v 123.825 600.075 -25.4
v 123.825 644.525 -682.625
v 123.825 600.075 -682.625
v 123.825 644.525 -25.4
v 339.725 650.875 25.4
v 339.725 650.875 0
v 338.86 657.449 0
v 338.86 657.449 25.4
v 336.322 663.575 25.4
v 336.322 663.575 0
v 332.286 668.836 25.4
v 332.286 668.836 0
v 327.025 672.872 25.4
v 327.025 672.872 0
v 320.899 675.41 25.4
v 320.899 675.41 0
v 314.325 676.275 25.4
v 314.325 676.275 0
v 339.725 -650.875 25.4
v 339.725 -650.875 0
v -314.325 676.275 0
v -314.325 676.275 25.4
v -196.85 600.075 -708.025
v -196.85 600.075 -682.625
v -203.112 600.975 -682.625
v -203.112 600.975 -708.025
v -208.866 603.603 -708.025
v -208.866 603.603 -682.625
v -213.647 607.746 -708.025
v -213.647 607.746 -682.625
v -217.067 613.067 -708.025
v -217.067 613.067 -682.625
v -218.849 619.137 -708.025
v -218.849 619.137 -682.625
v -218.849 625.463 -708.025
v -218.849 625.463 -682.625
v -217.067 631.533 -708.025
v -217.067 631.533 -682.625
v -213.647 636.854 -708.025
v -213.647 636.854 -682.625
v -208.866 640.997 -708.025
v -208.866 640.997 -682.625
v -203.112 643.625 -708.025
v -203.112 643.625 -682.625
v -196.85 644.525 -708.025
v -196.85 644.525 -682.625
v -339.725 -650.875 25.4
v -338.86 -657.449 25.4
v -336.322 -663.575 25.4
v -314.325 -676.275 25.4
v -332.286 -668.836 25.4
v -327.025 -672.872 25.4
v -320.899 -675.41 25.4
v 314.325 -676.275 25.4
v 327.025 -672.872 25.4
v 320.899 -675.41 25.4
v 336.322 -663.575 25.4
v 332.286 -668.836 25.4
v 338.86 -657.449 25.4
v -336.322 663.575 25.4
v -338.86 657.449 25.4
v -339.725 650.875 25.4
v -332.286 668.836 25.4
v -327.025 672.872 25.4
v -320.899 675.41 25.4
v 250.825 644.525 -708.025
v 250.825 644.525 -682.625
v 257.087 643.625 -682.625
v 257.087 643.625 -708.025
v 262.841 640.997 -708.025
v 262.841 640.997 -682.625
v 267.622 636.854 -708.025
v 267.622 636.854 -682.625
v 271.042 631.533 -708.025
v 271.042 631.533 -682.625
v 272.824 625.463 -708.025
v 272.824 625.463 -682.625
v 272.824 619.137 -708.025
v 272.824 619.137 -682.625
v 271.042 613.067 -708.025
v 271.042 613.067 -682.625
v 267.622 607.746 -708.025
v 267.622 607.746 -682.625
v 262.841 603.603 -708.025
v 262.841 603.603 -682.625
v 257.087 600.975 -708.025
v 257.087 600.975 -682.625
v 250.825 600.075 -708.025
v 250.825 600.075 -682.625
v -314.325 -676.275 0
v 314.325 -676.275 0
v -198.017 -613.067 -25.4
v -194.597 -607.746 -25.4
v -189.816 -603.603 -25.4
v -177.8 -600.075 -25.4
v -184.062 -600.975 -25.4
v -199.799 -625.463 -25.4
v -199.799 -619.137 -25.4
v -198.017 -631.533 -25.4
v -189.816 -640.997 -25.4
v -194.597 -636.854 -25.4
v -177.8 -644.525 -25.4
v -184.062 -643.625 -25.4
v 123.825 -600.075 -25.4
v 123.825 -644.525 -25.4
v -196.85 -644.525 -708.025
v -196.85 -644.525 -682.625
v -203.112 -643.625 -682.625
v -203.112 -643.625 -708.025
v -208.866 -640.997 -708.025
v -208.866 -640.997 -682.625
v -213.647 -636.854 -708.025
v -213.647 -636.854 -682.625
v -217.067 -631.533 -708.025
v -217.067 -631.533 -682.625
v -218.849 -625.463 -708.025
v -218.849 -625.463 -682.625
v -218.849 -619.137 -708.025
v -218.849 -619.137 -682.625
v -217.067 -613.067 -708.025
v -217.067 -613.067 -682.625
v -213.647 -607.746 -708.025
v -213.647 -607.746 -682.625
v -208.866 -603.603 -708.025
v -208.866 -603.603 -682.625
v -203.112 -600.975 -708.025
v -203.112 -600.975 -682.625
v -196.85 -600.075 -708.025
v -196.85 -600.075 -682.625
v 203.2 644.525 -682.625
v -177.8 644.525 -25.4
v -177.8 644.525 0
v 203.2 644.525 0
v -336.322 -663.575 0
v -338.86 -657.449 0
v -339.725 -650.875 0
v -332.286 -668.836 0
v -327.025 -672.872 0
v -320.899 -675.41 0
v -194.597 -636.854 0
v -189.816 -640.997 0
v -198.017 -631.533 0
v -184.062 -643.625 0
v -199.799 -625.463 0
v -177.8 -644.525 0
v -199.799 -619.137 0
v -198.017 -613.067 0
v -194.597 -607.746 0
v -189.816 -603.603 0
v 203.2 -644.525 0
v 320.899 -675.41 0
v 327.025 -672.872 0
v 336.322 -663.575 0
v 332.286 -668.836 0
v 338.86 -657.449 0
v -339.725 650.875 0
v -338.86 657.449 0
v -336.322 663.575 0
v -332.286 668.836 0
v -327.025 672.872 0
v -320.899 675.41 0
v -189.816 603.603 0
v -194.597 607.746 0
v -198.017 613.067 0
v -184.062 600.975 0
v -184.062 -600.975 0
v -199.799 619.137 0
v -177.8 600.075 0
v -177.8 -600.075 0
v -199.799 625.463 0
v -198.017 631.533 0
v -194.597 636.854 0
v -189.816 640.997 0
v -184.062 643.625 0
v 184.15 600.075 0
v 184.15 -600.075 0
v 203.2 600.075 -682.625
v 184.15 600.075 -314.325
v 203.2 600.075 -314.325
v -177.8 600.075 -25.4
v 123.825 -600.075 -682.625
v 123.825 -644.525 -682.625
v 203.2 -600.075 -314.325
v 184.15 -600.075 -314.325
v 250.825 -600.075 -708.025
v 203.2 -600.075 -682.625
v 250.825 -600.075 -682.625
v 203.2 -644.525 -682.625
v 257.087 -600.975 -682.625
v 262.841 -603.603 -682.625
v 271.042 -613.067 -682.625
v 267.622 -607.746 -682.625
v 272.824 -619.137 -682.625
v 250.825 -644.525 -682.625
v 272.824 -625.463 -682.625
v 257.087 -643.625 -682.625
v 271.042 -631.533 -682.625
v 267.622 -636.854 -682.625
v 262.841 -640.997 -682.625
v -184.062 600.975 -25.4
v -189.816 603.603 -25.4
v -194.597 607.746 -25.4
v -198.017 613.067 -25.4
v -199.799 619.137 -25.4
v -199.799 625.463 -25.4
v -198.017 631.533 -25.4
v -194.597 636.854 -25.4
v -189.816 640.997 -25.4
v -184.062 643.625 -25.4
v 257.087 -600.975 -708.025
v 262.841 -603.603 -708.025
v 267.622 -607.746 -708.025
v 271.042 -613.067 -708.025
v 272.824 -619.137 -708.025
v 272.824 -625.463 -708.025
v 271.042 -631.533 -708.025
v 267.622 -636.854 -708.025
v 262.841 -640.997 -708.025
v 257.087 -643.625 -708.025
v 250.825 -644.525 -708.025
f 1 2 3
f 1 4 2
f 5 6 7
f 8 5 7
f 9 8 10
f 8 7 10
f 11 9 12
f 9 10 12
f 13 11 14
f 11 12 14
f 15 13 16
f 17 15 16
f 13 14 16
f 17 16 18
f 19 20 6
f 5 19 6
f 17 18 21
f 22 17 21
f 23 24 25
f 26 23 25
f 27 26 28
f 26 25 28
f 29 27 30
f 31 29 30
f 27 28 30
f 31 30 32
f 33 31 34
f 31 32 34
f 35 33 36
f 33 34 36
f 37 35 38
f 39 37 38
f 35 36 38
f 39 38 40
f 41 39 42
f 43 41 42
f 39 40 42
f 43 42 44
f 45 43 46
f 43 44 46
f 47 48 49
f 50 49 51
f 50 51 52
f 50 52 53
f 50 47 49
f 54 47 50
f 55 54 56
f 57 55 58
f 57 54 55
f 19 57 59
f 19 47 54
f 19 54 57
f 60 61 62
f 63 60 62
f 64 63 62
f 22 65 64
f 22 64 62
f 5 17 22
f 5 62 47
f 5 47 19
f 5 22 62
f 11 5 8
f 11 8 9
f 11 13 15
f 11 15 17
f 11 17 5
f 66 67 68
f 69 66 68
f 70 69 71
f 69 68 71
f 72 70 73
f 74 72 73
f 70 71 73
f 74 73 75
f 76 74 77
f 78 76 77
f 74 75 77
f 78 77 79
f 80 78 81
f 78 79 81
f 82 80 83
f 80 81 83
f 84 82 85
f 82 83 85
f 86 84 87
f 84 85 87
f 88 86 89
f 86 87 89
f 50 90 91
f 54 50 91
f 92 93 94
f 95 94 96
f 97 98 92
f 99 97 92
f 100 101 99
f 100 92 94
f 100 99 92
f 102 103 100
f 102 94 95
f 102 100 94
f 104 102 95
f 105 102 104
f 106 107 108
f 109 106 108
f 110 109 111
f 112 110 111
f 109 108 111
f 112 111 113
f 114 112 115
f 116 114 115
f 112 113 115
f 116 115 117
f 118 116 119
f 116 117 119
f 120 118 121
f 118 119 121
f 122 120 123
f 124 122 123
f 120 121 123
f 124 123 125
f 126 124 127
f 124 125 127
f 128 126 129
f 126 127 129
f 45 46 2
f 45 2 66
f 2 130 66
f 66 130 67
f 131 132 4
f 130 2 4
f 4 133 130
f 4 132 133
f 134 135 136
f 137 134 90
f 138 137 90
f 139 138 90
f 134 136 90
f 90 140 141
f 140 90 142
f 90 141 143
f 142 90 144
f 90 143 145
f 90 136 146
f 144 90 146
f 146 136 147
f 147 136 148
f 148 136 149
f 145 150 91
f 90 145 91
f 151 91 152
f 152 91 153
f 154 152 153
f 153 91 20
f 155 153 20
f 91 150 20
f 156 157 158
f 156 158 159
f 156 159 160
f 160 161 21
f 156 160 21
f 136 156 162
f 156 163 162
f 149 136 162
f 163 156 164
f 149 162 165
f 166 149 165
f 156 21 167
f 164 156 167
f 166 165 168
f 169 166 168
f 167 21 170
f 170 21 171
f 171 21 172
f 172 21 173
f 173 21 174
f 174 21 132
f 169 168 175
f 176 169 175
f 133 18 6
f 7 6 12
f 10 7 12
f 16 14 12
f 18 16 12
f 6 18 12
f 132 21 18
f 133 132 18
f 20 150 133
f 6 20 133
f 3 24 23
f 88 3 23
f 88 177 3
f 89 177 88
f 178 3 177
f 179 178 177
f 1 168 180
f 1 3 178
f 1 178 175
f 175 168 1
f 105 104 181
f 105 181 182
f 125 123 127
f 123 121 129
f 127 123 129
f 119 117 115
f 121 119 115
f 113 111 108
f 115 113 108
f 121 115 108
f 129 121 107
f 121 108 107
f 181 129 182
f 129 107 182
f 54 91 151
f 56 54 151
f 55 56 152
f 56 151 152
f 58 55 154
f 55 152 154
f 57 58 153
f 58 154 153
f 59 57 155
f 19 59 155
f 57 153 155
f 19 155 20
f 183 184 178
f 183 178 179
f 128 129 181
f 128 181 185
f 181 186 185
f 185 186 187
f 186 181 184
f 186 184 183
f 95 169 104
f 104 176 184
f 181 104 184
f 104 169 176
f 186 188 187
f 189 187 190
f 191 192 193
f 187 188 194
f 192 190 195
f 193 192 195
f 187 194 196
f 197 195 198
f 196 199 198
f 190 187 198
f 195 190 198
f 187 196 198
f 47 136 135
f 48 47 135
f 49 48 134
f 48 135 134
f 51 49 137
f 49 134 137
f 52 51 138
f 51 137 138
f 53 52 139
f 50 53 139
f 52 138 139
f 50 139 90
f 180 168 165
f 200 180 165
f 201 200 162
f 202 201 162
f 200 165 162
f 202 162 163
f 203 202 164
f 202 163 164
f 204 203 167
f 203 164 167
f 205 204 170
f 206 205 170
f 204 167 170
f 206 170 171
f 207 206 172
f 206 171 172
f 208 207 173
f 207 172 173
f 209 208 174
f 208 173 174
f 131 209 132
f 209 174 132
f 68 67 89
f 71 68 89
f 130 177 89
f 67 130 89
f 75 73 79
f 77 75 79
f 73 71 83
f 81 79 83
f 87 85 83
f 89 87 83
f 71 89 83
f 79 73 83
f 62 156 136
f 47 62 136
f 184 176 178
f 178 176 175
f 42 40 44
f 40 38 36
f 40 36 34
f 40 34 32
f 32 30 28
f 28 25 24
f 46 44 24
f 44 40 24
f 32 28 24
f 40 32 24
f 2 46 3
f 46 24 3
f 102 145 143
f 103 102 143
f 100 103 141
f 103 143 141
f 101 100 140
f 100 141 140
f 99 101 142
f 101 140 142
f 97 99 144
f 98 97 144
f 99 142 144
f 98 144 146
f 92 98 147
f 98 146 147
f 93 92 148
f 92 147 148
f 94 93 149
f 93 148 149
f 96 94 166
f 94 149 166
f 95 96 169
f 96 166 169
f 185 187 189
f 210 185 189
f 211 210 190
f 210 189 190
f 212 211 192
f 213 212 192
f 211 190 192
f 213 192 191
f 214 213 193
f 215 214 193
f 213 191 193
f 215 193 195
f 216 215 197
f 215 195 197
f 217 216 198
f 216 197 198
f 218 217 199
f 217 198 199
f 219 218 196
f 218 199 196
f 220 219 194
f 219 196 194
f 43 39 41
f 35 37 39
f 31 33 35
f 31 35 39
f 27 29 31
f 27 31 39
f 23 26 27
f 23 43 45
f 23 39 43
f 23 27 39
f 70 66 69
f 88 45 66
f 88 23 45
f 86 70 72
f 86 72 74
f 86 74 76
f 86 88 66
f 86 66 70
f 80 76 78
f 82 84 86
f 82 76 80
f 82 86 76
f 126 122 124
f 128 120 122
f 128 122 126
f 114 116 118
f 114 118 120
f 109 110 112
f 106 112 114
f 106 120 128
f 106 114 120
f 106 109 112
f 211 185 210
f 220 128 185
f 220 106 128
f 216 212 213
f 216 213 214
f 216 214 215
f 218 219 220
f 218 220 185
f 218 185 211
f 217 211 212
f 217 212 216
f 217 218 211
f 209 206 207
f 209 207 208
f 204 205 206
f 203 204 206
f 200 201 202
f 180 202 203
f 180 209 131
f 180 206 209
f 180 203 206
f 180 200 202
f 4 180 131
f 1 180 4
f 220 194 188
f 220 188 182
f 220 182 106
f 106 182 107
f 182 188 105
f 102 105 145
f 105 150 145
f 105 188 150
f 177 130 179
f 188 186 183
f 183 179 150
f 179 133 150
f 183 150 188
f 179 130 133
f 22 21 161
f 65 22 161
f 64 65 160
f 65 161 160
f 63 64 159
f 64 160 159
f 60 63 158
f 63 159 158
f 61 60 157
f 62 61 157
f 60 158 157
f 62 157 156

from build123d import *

# Parameters (mm, degrees)
F1_DEPTH = 25.4
F3_DEPTH = 25.4
F5_DEPTH = 288.925
F6_W     = 79.375
F6_H     = 44.45
F7_DEPTH = 368.3
F9_DEPTH = 25.4


with BuildPart() as f1:
    # F0 (on Top) → F1 (new body)
    with BuildSketch(Plane.XY):
        with BuildLine():
            ThreePointArc((339.725, 650.875), (332.285512, 668.835512), (314.325, 676.275))
            Line((314.325, 676.275), (-314.325, 676.275))
            ThreePointArc((-314.325, 676.275), (-332.285512, 668.835512), (-339.725, 650.875))
            Line((-339.725, 650.875), (-339.725, -650.875))
            ThreePointArc((-339.725, -650.875), (-332.285512, -668.835512), (-314.325, -676.275))
            Line((-314.325, -676.275), (314.325, -676.275))
            ThreePointArc((314.325, -676.275), (332.285512, -668.835512), (339.725, -650.875))
            Line((339.725, -650.875), (339.725, 650.875))
        make_face()
    extrude(amount=F1_DEPTH)

    # F2 (on face) → F3 (join)
    with BuildSketch(Plane(origin=(0, 0, 0), x_dir=(1, 0, 0), z_dir=(0, 0, -1))):
        with BuildLine():
            ThreePointArc((-177.8, 644.525), (-200.025, 622.3), (-177.8, 600.075))
            Line((-177.8, 600.075), (184.15, 600.075))
            Line((184.15, 600.075), (184.15, -600.075))
            Line((184.15, -600.075), (-177.8, -600.075))
            ThreePointArc((-177.8, -600.075), (-200.025, -622.3), (-177.8, -644.525))
            Line((-177.8, -644.525), (203.2, -644.525))
            Line((203.2, -644.525), (203.2, 644.525))
            Line((203.2, 644.525), (-177.8, 644.525))
        make_face()
    extrude(amount=F3_DEPTH)

    # F4 (on face) → F5 (join)
    with BuildSketch(Plane(origin=(0, 0, -25.4), x_dir=(1, 0, 0), z_dir=(0, 0, -1))):
        Polygon((123.825, 644.525), (123.825, 600.075), (184.15, 600.075), (184.15, -600.075), (123.825, -600.075), (123.825, -644.525), (203.2, -644.525), (203.2, 644.525), align=None)
    extrude(amount=F5_DEPTH)

    # F6 (on face) → F7 (join)
    with BuildSketch(Plane(origin=(0, 0, -314.325), x_dir=(1, 0, 0), z_dir=(0, 0, -1))):
        with Locations((163.5125, -622.3)):
            Rectangle(F6_W, F6_H)
        with Locations((163.5125, 622.3)):
            Rectangle(F6_W, F6_H)
    extrude(amount=F7_DEPTH)

    # F8 (on face) → F9 (join)
    with BuildSketch(Plane(origin=(0, 0, -682.625), x_dir=(1, 0, 0), z_dir=(0, 0, -1))):
        with BuildLine():
            ThreePointArc((250.825, 600.075), (273.05, 622.3), (250.825, 644.525))
            Line((250.825, 644.525), (-196.85, 644.525))
            ThreePointArc((-196.85, 644.525), (-219.075, 622.3), (-196.85, 600.075))
            Line((-196.85, 600.075), (250.825, 600.075))
        make_face()
        with BuildLine():
            Line((250.825, -600.075), (-196.85, -600.075))
            ThreePointArc((-196.85, -600.075), (-219.075, -622.3), (-196.85, -644.525))
            Line((-196.85, -644.525), (250.825, -644.525))
            ThreePointArc((250.825, -644.525), (273.05, -622.3), (250.825, -600.075))
        make_face()
    extrude(amount=F9_DEPTH)


solid = f1.part
